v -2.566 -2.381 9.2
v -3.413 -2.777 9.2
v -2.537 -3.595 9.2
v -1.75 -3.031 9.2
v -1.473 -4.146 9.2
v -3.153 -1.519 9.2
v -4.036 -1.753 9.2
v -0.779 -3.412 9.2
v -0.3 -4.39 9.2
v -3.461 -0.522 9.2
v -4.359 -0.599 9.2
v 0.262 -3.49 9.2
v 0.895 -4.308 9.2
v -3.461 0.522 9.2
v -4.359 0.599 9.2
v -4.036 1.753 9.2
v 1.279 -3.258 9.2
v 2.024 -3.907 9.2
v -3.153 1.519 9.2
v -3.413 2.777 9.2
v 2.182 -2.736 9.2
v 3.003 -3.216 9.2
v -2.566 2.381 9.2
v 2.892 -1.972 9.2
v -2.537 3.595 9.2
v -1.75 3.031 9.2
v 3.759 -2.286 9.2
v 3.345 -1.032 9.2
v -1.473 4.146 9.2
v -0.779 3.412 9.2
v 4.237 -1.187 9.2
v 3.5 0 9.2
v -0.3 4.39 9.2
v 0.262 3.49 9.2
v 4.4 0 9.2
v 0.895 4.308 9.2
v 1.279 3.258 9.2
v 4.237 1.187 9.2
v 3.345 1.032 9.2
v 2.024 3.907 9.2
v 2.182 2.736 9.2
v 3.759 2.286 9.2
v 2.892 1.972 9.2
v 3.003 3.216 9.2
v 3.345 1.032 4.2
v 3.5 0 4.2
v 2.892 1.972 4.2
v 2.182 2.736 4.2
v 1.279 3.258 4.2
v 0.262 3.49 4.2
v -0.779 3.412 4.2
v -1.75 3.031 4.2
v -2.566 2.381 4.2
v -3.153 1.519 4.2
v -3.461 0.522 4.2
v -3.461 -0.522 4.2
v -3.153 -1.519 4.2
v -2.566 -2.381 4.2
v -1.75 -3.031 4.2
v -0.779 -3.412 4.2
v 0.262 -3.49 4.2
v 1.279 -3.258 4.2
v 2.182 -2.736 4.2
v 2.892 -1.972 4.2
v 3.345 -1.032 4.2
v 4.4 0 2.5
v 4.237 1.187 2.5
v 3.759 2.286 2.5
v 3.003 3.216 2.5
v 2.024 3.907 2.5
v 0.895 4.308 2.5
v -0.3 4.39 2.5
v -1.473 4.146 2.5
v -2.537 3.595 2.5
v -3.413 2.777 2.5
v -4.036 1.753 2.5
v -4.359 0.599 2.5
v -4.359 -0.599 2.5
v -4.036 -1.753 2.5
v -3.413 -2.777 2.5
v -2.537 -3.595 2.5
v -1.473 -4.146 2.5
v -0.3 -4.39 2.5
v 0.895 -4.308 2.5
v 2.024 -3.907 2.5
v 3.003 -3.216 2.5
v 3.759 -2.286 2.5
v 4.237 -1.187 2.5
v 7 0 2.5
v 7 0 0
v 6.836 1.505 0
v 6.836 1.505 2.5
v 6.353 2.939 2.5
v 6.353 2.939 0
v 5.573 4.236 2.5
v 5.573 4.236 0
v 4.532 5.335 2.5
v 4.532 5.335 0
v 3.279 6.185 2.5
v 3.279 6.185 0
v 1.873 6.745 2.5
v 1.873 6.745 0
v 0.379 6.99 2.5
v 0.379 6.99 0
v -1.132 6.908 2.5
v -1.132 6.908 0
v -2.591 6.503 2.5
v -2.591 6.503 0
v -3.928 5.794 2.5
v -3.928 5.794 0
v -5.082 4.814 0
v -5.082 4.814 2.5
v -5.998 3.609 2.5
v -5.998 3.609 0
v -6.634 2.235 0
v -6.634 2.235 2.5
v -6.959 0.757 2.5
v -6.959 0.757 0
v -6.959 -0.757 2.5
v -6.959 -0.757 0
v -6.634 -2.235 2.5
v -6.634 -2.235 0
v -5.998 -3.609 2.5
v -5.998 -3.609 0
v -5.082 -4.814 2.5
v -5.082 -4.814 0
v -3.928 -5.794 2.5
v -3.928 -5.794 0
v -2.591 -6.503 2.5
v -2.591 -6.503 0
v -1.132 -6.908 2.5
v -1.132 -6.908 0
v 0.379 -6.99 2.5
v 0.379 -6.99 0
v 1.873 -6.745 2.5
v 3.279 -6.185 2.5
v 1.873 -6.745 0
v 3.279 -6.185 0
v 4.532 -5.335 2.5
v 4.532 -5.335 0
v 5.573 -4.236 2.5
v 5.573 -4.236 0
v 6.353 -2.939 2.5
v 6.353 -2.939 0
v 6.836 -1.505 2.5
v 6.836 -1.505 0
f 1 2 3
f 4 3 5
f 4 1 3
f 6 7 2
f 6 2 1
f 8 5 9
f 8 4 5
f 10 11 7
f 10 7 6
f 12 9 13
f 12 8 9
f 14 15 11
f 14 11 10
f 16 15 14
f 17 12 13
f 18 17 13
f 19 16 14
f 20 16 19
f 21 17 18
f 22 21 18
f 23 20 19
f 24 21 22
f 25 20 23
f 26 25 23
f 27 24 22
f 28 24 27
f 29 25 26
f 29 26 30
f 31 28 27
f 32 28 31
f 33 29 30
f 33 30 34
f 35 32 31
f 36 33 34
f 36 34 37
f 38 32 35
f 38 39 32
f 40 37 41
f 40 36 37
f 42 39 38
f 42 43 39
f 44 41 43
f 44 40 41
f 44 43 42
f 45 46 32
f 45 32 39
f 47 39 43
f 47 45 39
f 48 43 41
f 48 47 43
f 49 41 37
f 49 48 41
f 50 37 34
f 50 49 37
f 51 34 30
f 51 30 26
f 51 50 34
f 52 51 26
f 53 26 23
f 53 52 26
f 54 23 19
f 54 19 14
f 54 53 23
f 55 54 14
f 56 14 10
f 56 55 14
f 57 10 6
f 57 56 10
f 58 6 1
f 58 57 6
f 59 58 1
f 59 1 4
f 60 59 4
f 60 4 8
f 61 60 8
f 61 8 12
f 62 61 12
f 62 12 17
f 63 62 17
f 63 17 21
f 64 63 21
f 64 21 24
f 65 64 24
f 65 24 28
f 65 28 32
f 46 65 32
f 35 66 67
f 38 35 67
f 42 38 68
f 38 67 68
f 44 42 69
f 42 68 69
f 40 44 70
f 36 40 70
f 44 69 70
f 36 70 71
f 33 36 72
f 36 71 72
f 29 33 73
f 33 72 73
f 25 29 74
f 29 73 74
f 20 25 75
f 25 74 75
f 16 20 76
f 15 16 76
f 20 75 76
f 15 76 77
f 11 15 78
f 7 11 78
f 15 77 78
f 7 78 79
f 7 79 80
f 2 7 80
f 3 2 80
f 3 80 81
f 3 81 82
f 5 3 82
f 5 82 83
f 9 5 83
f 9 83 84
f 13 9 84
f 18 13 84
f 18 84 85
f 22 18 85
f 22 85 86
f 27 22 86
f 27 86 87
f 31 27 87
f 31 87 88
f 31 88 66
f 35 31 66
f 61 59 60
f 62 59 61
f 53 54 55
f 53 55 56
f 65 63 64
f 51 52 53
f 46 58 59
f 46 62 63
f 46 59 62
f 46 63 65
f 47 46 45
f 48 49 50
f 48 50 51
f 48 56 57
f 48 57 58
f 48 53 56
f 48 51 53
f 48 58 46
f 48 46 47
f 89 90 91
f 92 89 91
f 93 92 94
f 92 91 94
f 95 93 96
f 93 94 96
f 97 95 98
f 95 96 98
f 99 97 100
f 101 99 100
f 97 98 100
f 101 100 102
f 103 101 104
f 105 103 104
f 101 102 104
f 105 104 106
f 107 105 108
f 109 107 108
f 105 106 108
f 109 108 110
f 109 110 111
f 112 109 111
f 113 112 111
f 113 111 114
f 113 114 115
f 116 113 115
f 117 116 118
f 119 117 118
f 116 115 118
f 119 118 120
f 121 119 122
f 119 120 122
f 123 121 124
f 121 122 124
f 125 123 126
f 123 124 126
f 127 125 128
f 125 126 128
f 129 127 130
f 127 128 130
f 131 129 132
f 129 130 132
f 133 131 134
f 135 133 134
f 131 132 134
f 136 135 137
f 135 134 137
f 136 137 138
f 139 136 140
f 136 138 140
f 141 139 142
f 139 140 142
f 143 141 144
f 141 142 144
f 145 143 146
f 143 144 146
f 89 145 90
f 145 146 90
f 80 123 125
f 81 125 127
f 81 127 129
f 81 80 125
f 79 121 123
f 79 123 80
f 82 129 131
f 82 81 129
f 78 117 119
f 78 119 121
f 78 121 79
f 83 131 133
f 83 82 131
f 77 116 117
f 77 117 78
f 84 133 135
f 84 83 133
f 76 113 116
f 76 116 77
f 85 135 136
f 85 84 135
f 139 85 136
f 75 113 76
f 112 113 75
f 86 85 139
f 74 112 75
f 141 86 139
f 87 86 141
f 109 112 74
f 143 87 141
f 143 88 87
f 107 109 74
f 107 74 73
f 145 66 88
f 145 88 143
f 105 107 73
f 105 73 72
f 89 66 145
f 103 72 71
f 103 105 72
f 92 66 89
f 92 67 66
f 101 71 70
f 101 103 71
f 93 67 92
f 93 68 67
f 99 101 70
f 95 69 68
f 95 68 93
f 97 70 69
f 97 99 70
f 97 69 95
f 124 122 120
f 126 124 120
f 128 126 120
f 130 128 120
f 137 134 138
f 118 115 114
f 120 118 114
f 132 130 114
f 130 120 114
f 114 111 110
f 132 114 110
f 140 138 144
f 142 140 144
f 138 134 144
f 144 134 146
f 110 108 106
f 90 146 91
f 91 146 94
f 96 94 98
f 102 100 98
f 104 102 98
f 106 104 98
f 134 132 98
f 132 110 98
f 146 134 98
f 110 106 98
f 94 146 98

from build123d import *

# Parameters (mm, degrees)
F0_R     = 7
F0_R_2   = 4.4
F1_DEPTH = 2.5
F0_R_3   = 3.5
F2_DEPTH = 9.2
F3_DEPTH = 4.2


with BuildPart() as f1:
    # F0 (on Top) → F1 (new body)
    with BuildSketch(Plane.XY):
        Circle(F0_R)
        Circle(F0_R_2, mode=Mode.SUBTRACT)
    extrude(amount=F1_DEPTH)

    # F0 (on Top) → F2 (join)
    with BuildSketch(Plane.XY):
        Circle(F0_R_2)
        Circle(F0_R_3, mode=Mode.SUBTRACT)
    extrude(amount=F2_DEPTH)

    # F0 (on Top) → F3 (join)
    with BuildSketch(Plane.XY):
        Circle(F0_R_3)
    extrude(amount=F3_DEPTH)


solid = f1.part
